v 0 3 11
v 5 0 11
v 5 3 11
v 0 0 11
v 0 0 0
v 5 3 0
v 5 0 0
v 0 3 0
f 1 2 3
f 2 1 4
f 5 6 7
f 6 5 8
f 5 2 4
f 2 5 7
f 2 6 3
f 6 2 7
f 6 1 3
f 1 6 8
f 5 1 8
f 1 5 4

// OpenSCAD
// Generated by SolidPython 1.0.1 on 2020-07-29 00:46:54


cube(size = [5, 3, 11]);
/***********************************************
*********      SolidPython code:      **********
************************************************
 
# import packages: SolidPython
from solid import *
from solid.utils import *
from itertools import chain, combinations, permutations


class Resize:

    def __init__(self, scad_file):
        self.scad_file = scad_file
        #self.scad_file = import_scad(scad_file)
        # cone/cylinder param:
        self.r1 = 0
        self.r2 = 0
        self.h = 0
        # rectangular prism param:
        self.w = 0
        self.l = 0
        # ellipse param:
        self.r = 0

    # import OpenScad code (file name corresponds to shape)


    # classify shape + parameters
    def assign(self, param1, param2, param3):
        if self.scad_file == 'cone.scad':
            self.r1 = param1
            self.r2 = param2
            self.h = param3
        elif self.scad_file == 'cylinder.scad':
            self.r1 = param1
            self.r2 = param2
            self.h = param3
        elif self.scad_file == 'rectangularPrism.scad':
            self.h = param1
            self.l = param2
            self.w = param3
        else:
            self.r = param1
            self.h = param2

    # resize parameters
    def iterate(self):
        x = range(3, 20, 2)
        i = 1
        if self.scad_file == 'cone.scad':
            tempList = list(permutations(x, 2))
            for temp in tempList:
                param1 = temp[0]
                param2 = temp[1]
                filepath = 'produced_scad_files/' + 'cone' + str(param1) + '_' + str(param2) + '_' + '.scad'
                scad_render_to_file(cylinder(h=param1, r1=param2, r2=0), filepath)

        elif self.scad_file == 'cylinder.scad':
            tempList = list(permutations(x, 3))
            for temp in tempList:
                param1 = temp[0]
                param2 = temp[1]
                filepath = 'produced_scad_files/' + 'cylinder' + str(param1) + '_' + str(param2) + '_' + '.scad'
                scad_render_to_file(cylinder(h=param1, r1=param2, r2=param2), filepath)

        elif self.scad_file == 'rectangularPrism.scad':
            tempList = list(permutations(x, 3))
            for temp in tempList:
                param1 = temp[0]
                param2 = temp[1]
                param3 = temp[2]
                filepath = 'produced_scad_files/' + 'rectangularPrism' + str(param1) + '_' + str(param2) + '_' + str(
                    param3) + '.scad'
                scad_render_to_file(cube(size=(param1, param2, param3)), filepath)

        elif self.scad_file == 'ellipse.scad':
            tempList = list(permutations(x, 4))
            for temp in tempList:
                param1 = temp[0]
                param2 = temp[1]
                param3 = temp[2]
                param4 = temp[3]
                filepath = 'produced_scad_files/' + 'ellipse' + str(param1) + '_' + str(param2) + '_' + str(param3) + '_' + str(param4) + '.scad'
                scad_render_to_file(scale([param1, param2, param3])(sphere(r=param4)), filepath)

    def render_to_scadfile(self):
        scad_render_to_file(scad, 'example.scad') 
 
************************************************/
